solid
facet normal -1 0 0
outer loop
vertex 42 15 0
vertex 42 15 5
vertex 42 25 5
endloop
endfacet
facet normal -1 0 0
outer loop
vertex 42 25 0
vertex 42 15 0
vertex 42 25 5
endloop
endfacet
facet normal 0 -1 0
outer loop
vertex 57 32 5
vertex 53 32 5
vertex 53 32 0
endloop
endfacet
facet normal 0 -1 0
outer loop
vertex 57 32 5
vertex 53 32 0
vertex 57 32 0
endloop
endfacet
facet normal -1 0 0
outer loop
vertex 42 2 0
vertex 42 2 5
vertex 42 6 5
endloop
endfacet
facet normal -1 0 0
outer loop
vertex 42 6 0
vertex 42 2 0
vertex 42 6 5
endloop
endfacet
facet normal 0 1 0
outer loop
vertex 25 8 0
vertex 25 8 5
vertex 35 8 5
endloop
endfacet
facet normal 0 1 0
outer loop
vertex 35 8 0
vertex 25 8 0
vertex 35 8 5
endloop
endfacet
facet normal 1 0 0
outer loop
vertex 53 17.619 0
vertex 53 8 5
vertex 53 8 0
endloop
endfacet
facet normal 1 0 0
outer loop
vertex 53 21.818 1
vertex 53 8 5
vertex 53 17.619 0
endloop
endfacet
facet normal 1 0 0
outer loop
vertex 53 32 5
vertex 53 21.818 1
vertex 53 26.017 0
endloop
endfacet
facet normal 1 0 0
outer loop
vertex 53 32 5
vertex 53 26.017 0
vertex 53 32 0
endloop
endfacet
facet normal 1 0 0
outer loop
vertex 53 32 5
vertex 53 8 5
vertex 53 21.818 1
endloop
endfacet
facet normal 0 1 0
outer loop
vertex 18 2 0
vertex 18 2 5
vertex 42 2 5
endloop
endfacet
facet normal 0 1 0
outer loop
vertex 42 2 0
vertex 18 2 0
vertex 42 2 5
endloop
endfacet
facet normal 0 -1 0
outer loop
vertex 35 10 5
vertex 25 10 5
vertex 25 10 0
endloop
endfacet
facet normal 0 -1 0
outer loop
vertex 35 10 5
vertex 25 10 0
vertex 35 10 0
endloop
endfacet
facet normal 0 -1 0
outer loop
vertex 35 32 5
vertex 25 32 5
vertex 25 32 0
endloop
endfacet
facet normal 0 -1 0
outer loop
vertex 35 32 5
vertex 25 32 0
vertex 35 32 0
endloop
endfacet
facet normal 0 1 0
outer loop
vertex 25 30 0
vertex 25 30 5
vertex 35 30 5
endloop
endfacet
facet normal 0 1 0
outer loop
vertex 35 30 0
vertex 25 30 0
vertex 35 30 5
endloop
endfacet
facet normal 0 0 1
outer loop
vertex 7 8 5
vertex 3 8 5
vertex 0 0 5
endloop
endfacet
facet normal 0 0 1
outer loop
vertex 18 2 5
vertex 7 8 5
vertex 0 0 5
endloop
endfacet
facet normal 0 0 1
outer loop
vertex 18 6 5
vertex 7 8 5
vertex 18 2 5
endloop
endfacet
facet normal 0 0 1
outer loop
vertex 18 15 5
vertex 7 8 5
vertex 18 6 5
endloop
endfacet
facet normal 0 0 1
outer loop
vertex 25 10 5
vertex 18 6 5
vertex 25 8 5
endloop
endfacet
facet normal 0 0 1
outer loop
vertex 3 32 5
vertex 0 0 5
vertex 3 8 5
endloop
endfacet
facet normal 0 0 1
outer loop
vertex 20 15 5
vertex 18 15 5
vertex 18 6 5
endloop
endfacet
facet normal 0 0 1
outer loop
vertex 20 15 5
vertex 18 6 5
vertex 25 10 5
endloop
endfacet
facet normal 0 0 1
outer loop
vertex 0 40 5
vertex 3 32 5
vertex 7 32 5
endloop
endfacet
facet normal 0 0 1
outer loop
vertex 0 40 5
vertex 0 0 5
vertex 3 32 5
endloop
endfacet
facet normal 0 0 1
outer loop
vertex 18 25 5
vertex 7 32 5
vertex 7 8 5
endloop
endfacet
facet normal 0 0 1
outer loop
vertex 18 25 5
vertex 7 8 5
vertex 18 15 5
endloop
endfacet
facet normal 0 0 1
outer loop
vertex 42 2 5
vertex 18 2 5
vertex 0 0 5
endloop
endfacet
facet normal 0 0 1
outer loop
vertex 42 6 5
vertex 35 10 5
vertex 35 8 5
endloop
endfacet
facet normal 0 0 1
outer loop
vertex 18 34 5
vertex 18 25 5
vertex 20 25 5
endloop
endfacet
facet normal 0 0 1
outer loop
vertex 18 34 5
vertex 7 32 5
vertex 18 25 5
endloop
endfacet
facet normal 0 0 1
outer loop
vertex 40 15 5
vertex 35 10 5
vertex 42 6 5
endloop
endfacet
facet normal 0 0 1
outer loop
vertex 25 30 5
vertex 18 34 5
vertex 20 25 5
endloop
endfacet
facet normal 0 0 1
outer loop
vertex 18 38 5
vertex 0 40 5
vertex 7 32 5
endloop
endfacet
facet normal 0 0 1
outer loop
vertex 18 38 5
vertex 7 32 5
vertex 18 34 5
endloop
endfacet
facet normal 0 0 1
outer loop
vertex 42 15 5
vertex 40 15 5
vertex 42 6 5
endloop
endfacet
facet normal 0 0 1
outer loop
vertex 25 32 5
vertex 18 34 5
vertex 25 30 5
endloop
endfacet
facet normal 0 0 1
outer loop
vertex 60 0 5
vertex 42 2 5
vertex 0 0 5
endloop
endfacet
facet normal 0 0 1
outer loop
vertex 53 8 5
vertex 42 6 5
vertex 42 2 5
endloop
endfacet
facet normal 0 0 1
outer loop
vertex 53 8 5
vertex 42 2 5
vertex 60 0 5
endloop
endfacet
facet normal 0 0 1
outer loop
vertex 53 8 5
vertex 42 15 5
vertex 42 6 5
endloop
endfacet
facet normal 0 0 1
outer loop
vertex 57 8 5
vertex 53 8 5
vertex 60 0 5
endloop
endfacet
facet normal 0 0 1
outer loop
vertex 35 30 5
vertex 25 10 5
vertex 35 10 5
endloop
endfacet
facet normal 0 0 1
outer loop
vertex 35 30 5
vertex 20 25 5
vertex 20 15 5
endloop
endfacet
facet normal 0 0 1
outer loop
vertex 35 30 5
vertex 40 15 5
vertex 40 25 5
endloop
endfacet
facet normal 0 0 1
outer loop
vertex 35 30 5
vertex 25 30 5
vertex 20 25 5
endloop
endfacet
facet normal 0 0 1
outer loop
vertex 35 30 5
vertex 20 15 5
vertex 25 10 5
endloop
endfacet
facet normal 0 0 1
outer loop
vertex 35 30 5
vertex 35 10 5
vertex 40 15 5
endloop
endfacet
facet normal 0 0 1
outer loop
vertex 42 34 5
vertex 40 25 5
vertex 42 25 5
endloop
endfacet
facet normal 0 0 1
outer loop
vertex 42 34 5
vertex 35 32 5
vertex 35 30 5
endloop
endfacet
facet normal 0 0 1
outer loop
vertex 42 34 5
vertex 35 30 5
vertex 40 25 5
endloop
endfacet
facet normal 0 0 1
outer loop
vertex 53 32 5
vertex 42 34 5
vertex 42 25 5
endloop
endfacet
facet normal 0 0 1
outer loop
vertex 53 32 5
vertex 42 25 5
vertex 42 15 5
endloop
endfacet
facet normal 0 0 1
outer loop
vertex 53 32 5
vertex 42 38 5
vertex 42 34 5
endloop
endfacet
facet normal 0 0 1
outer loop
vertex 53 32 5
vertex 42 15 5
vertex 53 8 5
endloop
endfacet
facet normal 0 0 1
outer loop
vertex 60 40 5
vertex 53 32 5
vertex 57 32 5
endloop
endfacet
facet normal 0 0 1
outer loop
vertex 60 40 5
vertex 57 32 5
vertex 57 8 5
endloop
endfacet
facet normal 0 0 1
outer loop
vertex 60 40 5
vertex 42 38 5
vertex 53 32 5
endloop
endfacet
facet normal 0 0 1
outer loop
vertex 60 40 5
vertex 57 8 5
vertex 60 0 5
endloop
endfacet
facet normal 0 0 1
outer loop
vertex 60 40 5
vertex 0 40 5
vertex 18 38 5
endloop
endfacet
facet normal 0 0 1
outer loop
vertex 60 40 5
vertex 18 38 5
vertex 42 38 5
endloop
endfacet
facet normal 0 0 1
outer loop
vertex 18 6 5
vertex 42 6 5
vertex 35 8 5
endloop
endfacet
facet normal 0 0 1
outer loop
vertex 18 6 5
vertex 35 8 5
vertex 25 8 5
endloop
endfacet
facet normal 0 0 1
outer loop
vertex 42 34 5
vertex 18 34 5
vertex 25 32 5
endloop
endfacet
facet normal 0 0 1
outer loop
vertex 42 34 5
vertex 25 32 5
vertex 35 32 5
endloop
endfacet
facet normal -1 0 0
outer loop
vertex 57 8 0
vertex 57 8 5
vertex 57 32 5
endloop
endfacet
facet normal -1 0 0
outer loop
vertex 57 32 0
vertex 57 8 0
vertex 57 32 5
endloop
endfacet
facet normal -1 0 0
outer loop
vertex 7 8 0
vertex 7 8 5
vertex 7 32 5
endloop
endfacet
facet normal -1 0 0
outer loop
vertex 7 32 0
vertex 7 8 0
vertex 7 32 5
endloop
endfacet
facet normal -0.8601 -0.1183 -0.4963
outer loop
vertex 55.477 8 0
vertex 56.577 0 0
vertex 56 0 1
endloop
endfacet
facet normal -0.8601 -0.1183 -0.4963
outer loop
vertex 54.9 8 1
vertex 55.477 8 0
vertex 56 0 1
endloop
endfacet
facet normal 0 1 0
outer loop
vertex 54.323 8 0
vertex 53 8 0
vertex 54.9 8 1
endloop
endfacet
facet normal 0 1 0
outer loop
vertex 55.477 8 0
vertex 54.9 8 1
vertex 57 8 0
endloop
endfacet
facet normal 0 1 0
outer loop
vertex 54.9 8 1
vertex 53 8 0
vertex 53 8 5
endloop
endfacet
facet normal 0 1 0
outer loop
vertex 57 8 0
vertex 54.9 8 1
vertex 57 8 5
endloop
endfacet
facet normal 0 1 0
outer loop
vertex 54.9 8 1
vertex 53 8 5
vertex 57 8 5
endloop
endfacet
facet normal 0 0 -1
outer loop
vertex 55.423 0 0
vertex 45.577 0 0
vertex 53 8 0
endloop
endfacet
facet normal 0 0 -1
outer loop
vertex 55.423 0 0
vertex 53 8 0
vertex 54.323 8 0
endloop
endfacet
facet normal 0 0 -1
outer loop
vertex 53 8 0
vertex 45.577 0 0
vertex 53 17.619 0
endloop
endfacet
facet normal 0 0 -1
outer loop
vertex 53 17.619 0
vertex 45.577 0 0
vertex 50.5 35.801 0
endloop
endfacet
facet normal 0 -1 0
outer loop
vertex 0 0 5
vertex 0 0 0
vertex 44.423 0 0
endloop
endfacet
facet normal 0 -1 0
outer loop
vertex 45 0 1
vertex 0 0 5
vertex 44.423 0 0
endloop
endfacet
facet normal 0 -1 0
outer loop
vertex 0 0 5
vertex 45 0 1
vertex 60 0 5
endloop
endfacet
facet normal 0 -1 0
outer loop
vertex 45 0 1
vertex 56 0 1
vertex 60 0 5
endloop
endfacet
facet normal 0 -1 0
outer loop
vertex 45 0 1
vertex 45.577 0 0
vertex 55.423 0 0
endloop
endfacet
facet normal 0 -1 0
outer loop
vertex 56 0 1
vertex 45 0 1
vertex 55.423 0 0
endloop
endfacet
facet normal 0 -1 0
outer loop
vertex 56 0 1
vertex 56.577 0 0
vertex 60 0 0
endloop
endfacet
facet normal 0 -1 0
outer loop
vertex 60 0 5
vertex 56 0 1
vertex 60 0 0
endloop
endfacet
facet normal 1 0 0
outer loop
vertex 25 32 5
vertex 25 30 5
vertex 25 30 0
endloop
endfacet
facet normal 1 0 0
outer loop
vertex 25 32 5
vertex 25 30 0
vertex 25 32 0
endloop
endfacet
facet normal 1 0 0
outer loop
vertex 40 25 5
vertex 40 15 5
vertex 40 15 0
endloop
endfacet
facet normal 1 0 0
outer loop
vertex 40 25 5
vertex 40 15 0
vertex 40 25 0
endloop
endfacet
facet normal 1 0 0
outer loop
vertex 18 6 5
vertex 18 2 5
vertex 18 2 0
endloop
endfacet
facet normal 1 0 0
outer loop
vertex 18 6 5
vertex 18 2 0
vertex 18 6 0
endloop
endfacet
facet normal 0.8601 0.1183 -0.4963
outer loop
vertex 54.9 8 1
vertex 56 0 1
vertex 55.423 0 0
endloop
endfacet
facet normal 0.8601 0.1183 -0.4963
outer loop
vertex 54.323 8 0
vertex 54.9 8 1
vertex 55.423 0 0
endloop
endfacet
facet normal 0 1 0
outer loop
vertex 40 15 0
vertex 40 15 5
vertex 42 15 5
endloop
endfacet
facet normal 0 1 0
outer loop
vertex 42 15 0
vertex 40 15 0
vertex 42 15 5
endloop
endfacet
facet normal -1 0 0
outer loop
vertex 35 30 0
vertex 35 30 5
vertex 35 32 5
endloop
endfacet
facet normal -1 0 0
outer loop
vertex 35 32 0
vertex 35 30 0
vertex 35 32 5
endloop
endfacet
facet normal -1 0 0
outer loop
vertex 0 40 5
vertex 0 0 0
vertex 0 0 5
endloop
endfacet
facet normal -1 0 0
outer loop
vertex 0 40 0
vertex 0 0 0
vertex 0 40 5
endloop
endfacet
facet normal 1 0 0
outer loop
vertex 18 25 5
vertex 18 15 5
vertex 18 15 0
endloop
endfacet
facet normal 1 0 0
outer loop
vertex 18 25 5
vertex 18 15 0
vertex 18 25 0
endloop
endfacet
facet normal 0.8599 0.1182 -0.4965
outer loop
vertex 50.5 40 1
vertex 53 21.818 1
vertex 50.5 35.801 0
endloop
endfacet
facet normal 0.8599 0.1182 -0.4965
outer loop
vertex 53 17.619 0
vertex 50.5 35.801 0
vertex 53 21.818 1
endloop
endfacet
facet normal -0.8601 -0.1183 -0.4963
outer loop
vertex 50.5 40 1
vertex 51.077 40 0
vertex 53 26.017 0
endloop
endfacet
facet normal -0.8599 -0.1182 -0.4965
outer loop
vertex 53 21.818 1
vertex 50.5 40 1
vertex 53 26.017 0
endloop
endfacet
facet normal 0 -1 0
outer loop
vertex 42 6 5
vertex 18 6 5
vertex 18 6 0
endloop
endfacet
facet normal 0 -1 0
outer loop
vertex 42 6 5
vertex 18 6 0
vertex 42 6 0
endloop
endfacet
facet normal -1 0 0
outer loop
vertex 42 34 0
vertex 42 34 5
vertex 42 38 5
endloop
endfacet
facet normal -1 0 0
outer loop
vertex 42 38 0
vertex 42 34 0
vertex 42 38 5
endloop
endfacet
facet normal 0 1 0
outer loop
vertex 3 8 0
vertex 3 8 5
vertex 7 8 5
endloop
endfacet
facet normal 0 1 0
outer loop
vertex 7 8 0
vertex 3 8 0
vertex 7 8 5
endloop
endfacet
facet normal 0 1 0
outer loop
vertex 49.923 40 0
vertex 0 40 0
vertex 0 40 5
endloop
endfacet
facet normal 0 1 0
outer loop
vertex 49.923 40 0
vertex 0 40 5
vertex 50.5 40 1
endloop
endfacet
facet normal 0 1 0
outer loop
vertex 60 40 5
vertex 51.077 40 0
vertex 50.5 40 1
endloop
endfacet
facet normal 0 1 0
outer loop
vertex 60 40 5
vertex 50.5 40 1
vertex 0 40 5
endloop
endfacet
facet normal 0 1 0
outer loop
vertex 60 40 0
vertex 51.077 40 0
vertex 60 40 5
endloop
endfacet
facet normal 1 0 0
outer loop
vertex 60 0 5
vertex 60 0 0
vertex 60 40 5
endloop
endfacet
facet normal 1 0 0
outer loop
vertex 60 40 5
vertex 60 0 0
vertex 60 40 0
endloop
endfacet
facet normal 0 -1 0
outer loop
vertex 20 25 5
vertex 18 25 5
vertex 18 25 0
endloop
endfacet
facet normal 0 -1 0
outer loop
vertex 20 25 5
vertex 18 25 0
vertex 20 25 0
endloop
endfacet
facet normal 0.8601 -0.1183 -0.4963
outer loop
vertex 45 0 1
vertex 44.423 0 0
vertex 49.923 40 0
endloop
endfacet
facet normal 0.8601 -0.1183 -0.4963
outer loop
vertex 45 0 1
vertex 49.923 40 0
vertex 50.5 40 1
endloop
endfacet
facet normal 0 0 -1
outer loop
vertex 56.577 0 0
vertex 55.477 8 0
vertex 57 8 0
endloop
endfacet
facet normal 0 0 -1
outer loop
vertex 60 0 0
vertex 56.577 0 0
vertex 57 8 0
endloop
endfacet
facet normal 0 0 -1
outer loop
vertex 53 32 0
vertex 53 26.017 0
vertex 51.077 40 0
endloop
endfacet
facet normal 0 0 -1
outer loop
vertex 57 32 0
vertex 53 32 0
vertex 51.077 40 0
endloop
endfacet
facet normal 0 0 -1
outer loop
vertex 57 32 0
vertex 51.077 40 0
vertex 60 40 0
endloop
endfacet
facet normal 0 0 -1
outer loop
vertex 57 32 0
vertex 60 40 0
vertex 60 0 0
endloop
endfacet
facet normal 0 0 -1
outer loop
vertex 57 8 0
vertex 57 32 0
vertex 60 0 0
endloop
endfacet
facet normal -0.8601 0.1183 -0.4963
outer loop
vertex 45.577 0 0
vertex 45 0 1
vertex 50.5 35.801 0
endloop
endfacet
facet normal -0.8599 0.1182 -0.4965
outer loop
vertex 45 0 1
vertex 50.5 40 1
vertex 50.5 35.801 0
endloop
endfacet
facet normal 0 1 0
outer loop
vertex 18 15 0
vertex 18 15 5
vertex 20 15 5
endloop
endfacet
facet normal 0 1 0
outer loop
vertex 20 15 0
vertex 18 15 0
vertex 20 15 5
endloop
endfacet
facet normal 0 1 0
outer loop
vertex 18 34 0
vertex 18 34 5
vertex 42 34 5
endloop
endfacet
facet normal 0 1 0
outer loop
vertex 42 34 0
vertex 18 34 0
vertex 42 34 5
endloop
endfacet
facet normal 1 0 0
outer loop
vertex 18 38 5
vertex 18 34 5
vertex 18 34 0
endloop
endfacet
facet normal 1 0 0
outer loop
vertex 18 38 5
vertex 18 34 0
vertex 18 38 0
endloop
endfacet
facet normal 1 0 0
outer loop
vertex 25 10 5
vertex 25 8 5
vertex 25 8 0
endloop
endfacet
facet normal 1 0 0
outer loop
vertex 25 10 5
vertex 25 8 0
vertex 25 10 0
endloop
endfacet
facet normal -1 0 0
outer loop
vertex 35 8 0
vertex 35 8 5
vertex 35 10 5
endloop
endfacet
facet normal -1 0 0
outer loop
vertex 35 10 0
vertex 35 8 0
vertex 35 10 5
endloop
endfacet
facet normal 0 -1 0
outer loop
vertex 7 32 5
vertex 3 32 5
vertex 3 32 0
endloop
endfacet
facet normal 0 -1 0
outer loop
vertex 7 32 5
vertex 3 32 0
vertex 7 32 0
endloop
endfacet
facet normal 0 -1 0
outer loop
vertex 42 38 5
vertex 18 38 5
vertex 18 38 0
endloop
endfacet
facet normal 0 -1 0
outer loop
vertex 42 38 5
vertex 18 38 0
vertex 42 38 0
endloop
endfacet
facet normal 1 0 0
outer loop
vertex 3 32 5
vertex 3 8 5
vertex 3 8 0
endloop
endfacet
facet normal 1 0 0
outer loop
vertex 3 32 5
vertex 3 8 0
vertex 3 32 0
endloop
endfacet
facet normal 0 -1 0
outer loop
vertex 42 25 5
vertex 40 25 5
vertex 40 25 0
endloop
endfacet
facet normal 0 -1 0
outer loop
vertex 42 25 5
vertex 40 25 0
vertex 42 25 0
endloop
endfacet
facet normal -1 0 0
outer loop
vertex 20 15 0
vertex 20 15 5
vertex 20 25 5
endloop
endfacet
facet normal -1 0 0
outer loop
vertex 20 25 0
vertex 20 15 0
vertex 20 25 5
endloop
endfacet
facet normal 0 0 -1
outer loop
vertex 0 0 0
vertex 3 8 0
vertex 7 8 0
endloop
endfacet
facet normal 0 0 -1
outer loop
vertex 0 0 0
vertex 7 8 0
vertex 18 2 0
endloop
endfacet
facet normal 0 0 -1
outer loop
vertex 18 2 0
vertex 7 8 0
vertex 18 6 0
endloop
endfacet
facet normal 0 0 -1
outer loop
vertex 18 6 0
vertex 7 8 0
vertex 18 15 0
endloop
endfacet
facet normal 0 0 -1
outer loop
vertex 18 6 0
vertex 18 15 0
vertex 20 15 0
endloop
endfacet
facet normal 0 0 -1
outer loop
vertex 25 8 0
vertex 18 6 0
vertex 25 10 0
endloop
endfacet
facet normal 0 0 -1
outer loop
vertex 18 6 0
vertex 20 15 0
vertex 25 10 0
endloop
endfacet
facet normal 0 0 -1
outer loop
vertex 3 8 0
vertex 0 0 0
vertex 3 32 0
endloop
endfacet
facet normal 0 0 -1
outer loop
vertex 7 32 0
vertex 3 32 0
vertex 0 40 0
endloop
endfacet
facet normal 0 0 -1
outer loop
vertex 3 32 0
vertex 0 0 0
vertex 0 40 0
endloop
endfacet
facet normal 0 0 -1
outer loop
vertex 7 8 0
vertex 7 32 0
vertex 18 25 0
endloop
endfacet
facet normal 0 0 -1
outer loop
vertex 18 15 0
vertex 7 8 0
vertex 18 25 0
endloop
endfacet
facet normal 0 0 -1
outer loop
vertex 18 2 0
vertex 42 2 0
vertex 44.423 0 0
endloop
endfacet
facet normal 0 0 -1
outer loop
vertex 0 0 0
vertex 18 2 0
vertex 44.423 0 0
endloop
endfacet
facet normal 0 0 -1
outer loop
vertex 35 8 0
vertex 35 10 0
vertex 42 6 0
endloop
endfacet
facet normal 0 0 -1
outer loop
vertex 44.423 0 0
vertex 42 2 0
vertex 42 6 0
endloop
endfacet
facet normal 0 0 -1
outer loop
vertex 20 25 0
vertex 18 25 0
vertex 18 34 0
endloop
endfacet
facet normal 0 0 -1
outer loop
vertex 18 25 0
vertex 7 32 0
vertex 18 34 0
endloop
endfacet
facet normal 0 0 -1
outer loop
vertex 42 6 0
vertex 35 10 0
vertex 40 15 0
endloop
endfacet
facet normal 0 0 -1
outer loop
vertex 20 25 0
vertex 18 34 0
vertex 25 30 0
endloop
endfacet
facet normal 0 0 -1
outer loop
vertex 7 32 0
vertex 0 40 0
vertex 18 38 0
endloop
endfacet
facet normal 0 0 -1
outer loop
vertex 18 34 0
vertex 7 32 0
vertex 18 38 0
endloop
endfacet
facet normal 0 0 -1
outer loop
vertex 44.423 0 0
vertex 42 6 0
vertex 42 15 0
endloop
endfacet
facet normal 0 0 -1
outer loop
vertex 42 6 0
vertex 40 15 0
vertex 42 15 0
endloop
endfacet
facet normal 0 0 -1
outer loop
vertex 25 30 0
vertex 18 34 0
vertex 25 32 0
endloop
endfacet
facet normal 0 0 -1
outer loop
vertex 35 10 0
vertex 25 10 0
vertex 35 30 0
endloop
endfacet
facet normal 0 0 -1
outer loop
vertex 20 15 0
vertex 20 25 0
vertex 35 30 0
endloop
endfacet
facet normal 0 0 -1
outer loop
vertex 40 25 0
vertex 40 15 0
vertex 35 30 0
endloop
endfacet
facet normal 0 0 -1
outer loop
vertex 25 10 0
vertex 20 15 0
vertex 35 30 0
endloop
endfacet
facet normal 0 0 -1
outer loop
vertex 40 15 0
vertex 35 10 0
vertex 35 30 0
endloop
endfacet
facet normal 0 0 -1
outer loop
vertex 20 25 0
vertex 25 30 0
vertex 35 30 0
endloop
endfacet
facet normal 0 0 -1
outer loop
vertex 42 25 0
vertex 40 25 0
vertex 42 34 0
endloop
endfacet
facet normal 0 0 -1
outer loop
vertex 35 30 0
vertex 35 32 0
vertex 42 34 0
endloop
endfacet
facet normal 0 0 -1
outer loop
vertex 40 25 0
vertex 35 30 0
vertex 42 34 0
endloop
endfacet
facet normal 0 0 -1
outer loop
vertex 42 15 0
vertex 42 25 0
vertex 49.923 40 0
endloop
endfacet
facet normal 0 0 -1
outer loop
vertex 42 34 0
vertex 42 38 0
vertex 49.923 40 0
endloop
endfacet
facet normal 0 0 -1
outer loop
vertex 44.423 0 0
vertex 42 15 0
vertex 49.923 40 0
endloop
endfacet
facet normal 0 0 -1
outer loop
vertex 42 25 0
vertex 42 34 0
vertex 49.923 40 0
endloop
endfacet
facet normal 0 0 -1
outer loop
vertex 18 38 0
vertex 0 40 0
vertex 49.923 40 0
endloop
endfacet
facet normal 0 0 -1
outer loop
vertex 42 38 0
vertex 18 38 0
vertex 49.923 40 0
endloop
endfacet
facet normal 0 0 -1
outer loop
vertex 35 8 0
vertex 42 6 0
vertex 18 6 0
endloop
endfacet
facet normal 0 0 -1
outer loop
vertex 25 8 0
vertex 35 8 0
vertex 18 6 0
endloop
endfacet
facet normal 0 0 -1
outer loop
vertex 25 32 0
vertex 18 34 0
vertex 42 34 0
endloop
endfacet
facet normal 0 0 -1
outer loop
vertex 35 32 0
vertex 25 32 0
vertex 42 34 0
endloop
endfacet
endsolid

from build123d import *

# Parameters (mm, degrees)
SKETCH_1_W          = 60
SKETCH_1_H          = 40
EXTRUDE_1_DEPTH     = 5
SKETCH_2_W          = 2
SKETCH_2_H          = 10
SKETCH_2_W_2        = 10
SKETCH_2_H_2        = 2
SKETCH_2_W_3        = 4
SKETCH_2_H_3        = 24
SKETCH_2_W_4        = 24
SKETCH_2_H_4        = 4
CUT_EXTRUDE_1_DEPTH = 73.284161474
SWEEP_START         = -34
SWEEP_2_DEPTH       = 43
SWEEP_2_2_DEPTH     = 48


with BuildPart() as part:
    # 草图1 → 凸台-拉伸1 (new body)
    with BuildSketch(Plane.XY):
        with Locations((30, 20)):
            Rectangle(SKETCH_1_W, SKETCH_1_H)
    extrude(amount=EXTRUDE_1_DEPTH)

    # 草图2 → 切除-拉伸1 (cut, through all)
    with BuildSketch(Plane.XY.offset(5)):
        with Locations((19, 20)):
            Rectangle(SKETCH_2_W, SKETCH_2_H)
        with Locations((41, 20)):
            Rectangle(SKETCH_2_W, SKETCH_2_H)
        with Locations((30, 31)):
            Rectangle(SKETCH_2_W_2, SKETCH_2_H_2)
        with Locations((30, 9)):
            Rectangle(SKETCH_2_W_2, SKETCH_2_H_2)
        with Locations((5, 20)):
            Rectangle(SKETCH_2_W_3, SKETCH_2_H_3)
        with Locations((55, 20)):
            Rectangle(SKETCH_2_W_3, SKETCH_2_H_3)
        with Locations((30, 36)):
            Rectangle(SKETCH_2_W_4, SKETCH_2_H_4)
        with Locations((30, 4)):
            Rectangle(SKETCH_2_W_4, SKETCH_2_H_4)
    extrude(amount=-CUT_EXTRUDE_1_DEPTH, mode=Mode.SUBTRACT)

    # 切除-扫描2: read off the stored shape, not the designer's step
    # 切除-扫描2 outline → 切除-扫描2 (cut)
    with BuildSketch(Plane(origin=(0, 0, 0), x_dir=(0.9906788398452959, 0.13621834047872788, 0), z_dir=(0.13621834047872786, -0.9906788398452959, 0)).offset(SWEEP_START)):
        Polygon((56.049983726, 0), (55.478015031, 1), (54.906046336, 0), align=None)
    extrude(amount=SWEEP_2_DEPTH, mode=Mode.SUBTRACT)

    # Sweep 2 2 outline → Sweep 2 2 (cut)
    with BuildSketch(Plane(origin=(0, 0, 0), x_dir=(0.9906788398452959, -0.13621834047872777, 0), z_dir=(0.13621834047872777, 0.9906788398452959, 0))):
        Polygon((45.152516488, 0), (44.008579098, 0), (44.580547793, -1), align=None)
    extrude(amount=SWEEP_2_2_DEPTH, mode=Mode.SUBTRACT)


solid = part.part
